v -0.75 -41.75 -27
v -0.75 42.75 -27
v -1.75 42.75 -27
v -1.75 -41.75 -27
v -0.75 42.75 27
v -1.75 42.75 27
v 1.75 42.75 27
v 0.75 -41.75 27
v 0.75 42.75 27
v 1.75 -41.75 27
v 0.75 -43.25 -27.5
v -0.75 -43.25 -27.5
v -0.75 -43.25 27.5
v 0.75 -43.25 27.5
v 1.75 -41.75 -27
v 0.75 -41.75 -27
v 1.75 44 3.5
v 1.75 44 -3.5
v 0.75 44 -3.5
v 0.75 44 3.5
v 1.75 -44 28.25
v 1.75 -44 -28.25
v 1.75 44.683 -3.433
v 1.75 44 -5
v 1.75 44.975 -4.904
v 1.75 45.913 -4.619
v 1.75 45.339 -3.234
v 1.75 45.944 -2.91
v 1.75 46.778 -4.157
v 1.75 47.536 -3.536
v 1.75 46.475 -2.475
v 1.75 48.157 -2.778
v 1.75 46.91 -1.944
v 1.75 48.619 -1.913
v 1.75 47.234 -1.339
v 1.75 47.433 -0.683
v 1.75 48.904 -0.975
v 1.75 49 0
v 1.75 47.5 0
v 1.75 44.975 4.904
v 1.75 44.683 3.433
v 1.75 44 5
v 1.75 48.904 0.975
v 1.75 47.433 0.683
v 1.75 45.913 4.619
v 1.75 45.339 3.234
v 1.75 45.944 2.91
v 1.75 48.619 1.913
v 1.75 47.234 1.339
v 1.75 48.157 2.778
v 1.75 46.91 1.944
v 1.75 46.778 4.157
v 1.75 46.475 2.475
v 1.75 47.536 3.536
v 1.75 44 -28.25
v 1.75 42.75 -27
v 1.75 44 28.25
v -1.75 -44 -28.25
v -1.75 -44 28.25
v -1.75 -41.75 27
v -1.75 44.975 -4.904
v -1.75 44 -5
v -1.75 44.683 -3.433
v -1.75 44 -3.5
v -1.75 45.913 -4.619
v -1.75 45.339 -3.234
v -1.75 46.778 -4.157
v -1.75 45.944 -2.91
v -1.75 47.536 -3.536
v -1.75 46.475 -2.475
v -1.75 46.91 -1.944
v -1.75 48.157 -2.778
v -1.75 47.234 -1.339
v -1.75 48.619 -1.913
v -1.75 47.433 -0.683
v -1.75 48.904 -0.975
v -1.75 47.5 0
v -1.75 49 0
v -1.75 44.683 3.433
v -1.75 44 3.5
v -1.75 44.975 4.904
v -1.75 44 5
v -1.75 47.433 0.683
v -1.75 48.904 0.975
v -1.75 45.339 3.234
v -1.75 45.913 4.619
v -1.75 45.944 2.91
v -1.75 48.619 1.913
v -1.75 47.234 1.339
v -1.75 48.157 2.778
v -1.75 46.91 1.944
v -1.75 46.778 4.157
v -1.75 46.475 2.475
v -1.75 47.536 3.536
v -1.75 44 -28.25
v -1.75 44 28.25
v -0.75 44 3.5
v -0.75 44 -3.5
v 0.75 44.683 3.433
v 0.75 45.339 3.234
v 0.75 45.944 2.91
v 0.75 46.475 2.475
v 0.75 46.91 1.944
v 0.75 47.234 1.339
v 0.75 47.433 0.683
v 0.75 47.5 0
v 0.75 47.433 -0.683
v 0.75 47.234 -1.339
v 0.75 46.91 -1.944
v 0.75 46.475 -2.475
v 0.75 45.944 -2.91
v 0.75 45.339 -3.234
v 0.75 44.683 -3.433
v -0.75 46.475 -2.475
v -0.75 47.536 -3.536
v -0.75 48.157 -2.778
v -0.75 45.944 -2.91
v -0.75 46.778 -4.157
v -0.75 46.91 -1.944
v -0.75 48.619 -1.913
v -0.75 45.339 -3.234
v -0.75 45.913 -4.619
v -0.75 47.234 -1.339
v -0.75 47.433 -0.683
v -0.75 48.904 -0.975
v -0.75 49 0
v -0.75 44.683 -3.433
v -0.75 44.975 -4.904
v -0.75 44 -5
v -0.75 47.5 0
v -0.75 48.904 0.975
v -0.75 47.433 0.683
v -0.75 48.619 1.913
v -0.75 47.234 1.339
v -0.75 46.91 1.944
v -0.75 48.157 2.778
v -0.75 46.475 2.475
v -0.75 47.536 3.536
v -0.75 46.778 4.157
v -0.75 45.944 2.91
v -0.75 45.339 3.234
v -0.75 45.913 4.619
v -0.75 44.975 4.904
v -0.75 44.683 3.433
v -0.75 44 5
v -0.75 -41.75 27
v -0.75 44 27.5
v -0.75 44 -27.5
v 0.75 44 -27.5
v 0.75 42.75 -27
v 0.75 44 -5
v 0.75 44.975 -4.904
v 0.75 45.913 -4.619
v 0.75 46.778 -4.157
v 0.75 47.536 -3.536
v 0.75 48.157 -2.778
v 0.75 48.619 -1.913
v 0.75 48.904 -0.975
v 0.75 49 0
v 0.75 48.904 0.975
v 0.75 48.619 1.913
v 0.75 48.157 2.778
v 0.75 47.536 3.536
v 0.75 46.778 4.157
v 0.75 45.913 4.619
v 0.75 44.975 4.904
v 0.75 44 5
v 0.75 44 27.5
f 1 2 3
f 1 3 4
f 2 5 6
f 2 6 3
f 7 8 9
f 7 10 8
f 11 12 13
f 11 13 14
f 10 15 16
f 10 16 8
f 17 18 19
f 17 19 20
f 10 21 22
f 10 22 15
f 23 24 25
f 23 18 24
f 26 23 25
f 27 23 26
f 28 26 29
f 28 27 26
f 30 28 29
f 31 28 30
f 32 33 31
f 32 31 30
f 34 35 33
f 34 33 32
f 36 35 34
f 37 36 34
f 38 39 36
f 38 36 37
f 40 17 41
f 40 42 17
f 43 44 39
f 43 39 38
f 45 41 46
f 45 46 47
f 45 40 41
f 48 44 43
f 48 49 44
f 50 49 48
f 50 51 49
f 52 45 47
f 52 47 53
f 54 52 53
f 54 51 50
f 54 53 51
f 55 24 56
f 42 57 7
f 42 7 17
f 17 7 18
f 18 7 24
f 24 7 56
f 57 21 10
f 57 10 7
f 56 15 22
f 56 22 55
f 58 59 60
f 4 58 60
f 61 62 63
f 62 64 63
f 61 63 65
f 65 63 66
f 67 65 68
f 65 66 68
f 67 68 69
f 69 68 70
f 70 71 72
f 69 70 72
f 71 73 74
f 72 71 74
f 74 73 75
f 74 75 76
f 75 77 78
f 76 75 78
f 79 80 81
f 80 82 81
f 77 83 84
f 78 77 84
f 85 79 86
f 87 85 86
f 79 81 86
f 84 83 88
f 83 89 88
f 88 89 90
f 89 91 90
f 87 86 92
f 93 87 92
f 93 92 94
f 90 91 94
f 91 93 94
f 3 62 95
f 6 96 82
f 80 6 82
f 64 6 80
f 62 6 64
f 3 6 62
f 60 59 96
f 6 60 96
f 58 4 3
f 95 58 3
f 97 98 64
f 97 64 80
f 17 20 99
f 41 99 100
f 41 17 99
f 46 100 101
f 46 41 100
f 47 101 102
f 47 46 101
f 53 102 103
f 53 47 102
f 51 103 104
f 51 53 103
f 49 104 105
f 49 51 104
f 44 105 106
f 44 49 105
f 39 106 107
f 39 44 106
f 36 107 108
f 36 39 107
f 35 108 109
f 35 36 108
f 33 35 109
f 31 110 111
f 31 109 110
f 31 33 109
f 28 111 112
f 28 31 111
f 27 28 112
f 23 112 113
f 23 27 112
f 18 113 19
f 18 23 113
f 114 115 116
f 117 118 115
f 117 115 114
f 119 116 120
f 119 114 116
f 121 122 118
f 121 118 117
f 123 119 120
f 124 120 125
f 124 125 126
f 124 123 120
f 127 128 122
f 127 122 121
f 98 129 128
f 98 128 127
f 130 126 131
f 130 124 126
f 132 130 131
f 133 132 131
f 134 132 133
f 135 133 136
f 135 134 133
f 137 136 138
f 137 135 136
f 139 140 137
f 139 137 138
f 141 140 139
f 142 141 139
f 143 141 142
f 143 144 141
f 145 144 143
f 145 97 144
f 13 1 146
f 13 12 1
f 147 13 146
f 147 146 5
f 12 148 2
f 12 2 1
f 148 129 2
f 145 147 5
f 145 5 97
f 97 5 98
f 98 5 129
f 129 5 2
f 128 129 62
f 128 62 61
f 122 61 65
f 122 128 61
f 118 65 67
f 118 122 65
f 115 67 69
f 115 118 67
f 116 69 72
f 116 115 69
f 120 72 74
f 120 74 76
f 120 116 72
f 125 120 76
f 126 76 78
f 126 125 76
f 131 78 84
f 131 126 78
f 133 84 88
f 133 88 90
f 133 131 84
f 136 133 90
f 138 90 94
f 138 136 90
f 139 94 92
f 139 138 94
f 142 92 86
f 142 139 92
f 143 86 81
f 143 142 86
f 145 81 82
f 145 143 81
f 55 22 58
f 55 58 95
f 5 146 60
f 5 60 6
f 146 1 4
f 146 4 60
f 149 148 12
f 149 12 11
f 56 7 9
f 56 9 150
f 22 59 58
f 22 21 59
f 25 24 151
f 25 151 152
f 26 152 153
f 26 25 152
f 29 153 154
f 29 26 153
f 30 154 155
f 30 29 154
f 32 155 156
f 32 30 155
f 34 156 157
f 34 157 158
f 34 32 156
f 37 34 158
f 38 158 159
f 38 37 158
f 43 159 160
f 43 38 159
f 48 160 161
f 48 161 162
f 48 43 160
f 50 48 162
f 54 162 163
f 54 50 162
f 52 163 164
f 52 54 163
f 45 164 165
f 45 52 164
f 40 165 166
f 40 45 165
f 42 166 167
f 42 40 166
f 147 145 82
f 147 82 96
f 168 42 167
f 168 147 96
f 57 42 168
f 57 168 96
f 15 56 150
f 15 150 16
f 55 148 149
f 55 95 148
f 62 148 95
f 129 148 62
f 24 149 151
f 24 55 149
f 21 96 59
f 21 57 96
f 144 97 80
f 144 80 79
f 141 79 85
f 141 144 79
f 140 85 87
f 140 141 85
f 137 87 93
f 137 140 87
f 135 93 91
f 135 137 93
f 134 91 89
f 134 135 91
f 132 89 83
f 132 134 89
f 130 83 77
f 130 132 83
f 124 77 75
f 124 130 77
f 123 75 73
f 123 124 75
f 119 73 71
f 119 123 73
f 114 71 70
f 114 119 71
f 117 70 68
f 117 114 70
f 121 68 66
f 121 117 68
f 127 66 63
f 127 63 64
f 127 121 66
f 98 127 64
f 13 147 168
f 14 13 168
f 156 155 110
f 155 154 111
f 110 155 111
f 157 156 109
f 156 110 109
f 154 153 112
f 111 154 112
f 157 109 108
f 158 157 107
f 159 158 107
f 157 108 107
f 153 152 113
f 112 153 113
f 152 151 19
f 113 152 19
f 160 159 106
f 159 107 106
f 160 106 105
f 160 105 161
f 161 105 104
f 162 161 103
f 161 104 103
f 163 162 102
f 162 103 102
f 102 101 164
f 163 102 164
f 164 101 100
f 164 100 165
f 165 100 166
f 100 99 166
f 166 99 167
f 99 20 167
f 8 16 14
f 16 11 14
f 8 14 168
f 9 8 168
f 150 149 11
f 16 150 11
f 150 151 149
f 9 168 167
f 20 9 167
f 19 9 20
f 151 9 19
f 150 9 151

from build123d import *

# Parameters (mm, degrees)
F1_DEPTH      = 1.75
F2_W          = 1.5
F2_H          = 55
F3_DEPTH      = 43.25
F3_DEPTH_BACK = 58.6


with BuildPart() as f1:
    # F0 (on Right) → F1 (new body, symmetric)
    with BuildSketch(Plane.YZ):
        Polygon((-42.75, -27), (-42.75, 27), (-41.75, 27), (-41.75, 28.25), (-44, 28.25), (-44, -28.25), (-41.75, -28.25), (-41.75, -27), align=None)
        Polygon((-41.75, 27), (-42.75, 27), (-42.75, -27), (-41.75, -27), (-41.75, -26), (-41.75, 26), align=None)
        Polygon((-41.75, 28.25), (-41.75, 27), (42.75, 27), (42.75, -27), (-41.75, -27), (-41.75, -28.25), (44, -28.25), (44, -5), (44, -3.5), (44, 3.5), (44, 5), (44, 28.25), align=None)
        with BuildLine():
            ThreePointArc((44, -5), (49, 0), (44, 5))
            Line((44, 5), (44, 3.5))
            ThreePointArc((44, 3.5), (47.5, 0), (44, -3.5))
            Line((44, -3.5), (44, -5))
        make_face()
    extrude(amount=F1_DEPTH, both=True)

    # F2 (on Front) → F3 (cut, two sides)
    with BuildSketch(Plane.XZ) as f3_sk:
        Rectangle(F2_W, F2_H)
    extrude(amount=F3_DEPTH, mode=Mode.SUBTRACT)
    extrude(f3_sk.sketch, amount=-F3_DEPTH_BACK, mode=Mode.SUBTRACT)


solid = f1.part
